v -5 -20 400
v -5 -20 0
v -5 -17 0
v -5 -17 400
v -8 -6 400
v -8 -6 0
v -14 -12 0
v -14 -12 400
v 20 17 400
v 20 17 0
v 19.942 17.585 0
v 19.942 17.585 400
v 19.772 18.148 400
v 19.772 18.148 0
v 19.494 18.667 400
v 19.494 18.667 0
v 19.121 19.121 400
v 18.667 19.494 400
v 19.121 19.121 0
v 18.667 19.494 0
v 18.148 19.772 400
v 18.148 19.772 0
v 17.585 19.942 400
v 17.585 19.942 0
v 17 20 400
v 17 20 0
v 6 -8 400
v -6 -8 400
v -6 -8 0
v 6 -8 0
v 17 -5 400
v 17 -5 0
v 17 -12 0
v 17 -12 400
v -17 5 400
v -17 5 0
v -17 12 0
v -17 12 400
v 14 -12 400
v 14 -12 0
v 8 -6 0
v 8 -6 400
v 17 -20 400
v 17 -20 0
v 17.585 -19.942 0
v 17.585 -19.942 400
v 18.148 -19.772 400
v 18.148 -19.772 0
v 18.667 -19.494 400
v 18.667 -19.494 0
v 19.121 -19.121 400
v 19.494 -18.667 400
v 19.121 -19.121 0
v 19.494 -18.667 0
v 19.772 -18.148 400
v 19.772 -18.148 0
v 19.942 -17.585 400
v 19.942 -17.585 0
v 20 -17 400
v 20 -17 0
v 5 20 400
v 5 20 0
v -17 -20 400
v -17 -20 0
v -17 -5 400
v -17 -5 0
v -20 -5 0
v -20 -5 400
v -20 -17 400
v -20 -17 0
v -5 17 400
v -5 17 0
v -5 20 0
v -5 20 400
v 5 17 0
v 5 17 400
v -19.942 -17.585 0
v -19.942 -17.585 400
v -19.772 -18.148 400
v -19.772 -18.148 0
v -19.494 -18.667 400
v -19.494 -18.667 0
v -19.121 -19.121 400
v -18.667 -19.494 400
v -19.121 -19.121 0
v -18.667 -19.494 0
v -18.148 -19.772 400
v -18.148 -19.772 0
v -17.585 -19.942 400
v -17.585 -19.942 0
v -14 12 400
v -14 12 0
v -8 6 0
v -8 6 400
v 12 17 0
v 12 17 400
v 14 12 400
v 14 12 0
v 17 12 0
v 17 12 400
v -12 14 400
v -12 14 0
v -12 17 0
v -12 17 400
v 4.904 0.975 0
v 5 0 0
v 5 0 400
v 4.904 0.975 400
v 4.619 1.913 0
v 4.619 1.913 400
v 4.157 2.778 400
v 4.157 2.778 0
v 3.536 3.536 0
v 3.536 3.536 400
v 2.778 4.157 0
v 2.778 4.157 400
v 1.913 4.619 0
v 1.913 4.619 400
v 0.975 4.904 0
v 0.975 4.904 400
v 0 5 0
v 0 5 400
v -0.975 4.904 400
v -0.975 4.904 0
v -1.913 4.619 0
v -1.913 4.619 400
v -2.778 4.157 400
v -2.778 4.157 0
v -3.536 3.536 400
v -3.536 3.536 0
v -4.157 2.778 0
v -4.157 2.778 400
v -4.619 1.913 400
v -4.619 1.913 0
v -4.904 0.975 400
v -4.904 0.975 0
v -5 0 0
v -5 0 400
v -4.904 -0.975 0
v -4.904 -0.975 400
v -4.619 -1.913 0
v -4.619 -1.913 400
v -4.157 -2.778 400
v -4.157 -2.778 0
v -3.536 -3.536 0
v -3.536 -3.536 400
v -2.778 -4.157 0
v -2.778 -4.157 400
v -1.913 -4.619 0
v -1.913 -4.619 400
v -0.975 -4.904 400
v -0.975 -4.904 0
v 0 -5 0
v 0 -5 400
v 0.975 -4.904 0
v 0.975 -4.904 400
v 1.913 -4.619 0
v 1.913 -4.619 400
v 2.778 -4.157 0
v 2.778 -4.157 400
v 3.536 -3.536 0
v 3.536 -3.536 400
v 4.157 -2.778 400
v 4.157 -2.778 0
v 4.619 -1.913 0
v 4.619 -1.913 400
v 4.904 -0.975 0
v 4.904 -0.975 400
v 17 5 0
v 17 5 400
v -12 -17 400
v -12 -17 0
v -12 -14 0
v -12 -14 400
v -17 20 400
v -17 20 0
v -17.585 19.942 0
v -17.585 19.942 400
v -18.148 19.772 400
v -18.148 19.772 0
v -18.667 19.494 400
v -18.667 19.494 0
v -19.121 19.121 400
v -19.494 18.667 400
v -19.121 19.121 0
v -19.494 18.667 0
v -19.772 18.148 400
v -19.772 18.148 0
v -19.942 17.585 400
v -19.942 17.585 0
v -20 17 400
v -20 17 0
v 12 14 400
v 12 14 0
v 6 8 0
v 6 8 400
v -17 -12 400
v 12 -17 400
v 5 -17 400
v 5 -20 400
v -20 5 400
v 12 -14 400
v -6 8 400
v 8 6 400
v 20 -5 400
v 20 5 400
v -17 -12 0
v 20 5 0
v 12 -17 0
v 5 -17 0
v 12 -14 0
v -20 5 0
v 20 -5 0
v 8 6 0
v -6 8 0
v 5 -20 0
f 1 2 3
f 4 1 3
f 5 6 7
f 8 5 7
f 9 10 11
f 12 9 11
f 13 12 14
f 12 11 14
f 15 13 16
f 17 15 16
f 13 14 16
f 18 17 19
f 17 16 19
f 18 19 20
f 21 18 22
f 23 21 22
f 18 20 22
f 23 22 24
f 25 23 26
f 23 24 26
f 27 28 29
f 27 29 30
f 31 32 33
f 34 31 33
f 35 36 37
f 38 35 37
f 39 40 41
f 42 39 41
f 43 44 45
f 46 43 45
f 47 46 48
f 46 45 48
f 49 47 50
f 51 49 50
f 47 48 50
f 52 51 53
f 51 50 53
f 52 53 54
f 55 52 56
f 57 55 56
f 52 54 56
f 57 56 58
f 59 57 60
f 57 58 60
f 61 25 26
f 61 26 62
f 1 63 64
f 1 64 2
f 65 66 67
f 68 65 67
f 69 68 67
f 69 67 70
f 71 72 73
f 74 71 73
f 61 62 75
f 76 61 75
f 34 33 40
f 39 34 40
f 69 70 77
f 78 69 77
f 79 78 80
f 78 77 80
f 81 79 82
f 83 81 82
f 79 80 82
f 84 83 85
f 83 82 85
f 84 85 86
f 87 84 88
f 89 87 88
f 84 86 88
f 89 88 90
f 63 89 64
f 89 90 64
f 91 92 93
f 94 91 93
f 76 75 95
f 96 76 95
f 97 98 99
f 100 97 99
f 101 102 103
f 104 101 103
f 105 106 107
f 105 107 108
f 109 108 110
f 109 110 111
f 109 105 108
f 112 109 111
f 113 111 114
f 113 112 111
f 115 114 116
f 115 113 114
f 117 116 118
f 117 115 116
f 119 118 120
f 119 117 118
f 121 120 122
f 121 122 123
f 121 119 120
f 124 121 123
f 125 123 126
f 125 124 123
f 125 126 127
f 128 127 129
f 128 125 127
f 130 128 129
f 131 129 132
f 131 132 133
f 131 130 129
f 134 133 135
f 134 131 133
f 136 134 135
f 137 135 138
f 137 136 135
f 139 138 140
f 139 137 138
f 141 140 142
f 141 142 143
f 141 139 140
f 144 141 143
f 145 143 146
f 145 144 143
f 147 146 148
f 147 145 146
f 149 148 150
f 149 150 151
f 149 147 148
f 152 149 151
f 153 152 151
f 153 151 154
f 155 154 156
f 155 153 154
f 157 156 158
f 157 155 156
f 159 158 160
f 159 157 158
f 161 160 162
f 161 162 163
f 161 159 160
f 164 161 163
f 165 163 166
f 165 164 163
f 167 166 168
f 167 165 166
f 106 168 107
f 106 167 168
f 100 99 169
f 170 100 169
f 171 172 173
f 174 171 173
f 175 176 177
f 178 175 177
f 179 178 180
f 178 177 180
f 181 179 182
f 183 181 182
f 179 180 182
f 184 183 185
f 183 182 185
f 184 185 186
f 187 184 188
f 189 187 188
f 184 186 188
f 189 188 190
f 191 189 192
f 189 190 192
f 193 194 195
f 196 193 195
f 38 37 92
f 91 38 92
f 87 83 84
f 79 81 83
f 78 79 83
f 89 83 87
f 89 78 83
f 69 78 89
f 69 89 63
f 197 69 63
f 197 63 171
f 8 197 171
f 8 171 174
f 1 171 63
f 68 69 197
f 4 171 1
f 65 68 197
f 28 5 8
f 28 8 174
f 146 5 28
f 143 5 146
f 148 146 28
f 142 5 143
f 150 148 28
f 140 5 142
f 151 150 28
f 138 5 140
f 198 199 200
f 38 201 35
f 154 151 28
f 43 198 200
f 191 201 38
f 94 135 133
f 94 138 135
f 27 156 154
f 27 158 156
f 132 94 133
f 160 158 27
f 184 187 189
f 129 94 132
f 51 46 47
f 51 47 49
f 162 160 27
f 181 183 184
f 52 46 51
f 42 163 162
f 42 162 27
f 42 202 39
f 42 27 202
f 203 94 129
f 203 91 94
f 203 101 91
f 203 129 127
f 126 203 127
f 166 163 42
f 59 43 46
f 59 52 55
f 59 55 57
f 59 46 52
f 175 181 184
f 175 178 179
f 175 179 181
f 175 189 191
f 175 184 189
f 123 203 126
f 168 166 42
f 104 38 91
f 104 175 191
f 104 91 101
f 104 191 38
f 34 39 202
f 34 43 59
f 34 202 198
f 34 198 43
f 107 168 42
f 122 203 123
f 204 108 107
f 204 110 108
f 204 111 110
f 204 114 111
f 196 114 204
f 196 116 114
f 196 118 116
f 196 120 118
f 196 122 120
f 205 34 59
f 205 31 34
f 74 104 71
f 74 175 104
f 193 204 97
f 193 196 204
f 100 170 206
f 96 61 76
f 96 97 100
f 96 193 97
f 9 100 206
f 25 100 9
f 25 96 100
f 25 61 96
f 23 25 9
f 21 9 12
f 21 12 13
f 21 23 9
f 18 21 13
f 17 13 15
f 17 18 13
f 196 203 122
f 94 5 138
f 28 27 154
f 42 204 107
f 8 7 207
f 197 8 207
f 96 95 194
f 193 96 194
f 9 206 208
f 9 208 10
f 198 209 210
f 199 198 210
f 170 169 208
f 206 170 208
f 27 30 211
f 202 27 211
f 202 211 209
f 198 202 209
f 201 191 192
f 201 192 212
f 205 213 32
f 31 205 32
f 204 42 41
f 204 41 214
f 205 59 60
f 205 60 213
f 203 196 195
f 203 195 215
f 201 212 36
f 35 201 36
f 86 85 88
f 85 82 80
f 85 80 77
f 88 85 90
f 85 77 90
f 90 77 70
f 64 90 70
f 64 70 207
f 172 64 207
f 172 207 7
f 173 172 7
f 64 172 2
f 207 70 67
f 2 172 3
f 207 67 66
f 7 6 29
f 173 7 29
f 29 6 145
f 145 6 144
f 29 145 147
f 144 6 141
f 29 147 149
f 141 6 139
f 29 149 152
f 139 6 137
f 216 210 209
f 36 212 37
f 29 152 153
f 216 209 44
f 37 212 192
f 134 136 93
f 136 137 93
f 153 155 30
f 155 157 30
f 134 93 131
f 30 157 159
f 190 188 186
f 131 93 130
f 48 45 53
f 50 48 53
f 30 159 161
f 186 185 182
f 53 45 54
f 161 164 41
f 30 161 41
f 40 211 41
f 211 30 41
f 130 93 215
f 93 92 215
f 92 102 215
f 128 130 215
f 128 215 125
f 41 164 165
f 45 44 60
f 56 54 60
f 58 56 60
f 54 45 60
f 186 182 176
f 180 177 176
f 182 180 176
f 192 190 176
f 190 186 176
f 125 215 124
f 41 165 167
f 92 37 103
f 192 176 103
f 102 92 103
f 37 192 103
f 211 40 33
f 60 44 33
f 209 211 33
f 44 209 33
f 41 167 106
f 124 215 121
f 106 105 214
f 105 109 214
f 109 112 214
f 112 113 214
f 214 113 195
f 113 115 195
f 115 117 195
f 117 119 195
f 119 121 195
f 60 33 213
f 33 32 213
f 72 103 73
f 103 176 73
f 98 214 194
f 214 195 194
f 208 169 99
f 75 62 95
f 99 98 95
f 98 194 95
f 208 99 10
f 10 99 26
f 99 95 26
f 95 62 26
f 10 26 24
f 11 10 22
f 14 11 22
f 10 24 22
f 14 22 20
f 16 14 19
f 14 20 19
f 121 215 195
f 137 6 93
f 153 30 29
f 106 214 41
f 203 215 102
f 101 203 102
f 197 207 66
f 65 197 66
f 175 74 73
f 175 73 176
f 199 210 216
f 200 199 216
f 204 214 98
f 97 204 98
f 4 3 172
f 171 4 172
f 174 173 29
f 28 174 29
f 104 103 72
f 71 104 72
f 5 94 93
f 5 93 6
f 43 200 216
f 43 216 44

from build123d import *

# Parameters (mm, degrees)
F0_R     = 5
F1_DEPTH = 400


with BuildPart() as f1:
    # F0 (on Top) → F1 (new body)
    with BuildSketch(Plane.XY):
        with BuildLine():
            ThreePointArc((20, 17), (19.12132, 19.12132), (17, 20))
            Line((17, 20), (5, 20))
            Line((5, 20), (5, 17))
            Line((5, 17), (12, 17))
            Line((12, 17), (12, 14))
            Line((12, 14), (6, 8))
            Line((6, 8), (0, 8))
            Line((0, 8), (-6, 8))
            Line((-6, 8), (-12, 14))
            Line((-12, 14), (-12, 17))
            Line((-12, 17), (-5, 17))
            Line((-5, 17), (-5, 20))
            Line((-5, 20), (-17, 20))
            ThreePointArc((-17, 20), (-19.12132, 19.12132), (-20, 17))
            Line((-20, 17), (-20, 5))
            Line((-20, 5), (-17, 5))
            Line((-17, 5), (-17, 12))
            Line((-17, 12), (-14, 12))
            Line((-14, 12), (-8, 6))
            Line((-8, 6), (-8, 0))
            Line((-8, 0), (-8, -6))
            Line((-8, -6), (-14, -12))
            Line((-14, -12), (-17, -12))
            Line((-17, -12), (-17, -5))
            Line((-17, -5), (-20, -5))
            Line((-20, -5), (-20, -17))
            ThreePointArc((-20, -17), (-19.12132, -19.12132), (-17, -20))
            Line((-17, -20), (-5, -20))
            Line((-5, -20), (-5, -17))
            Line((-5, -17), (-12, -17))
            Line((-12, -17), (-12, -14))
            Line((-12, -14), (-6, -8))
            Line((-6, -8), (0, -8))
            Line((0, -8), (6, -8))
            Line((6, -8), (12, -14))
            Line((12, -14), (12, -17))
            Line((12, -17), (5, -17))
            Line((5, -17), (5, -20))
            Line((5, -20), (17, -20))
            ThreePointArc((17, -20), (19.12132, -19.12132), (20, -17))
            Line((20, -17), (20, -5))
            Line((20, -5), (17, -5))
            Line((17, -5), (17, -12))
            Line((17, -12), (14, -12))
            Line((14, -12), (8, -6))
            Line((8, -6), (8, 0))
            Line((8, 0), (8, 6))
            Line((8, 6), (14, 12))
            Line((14, 12), (17, 12))
            Line((17, 12), (17, 5))
            Line((17, 5), (20, 5))
            Line((20, 5), (20, 17))
        make_face()
        Circle(F0_R, mode=Mode.SUBTRACT)
    extrude(amount=F1_DEPTH)


solid = f1.part
